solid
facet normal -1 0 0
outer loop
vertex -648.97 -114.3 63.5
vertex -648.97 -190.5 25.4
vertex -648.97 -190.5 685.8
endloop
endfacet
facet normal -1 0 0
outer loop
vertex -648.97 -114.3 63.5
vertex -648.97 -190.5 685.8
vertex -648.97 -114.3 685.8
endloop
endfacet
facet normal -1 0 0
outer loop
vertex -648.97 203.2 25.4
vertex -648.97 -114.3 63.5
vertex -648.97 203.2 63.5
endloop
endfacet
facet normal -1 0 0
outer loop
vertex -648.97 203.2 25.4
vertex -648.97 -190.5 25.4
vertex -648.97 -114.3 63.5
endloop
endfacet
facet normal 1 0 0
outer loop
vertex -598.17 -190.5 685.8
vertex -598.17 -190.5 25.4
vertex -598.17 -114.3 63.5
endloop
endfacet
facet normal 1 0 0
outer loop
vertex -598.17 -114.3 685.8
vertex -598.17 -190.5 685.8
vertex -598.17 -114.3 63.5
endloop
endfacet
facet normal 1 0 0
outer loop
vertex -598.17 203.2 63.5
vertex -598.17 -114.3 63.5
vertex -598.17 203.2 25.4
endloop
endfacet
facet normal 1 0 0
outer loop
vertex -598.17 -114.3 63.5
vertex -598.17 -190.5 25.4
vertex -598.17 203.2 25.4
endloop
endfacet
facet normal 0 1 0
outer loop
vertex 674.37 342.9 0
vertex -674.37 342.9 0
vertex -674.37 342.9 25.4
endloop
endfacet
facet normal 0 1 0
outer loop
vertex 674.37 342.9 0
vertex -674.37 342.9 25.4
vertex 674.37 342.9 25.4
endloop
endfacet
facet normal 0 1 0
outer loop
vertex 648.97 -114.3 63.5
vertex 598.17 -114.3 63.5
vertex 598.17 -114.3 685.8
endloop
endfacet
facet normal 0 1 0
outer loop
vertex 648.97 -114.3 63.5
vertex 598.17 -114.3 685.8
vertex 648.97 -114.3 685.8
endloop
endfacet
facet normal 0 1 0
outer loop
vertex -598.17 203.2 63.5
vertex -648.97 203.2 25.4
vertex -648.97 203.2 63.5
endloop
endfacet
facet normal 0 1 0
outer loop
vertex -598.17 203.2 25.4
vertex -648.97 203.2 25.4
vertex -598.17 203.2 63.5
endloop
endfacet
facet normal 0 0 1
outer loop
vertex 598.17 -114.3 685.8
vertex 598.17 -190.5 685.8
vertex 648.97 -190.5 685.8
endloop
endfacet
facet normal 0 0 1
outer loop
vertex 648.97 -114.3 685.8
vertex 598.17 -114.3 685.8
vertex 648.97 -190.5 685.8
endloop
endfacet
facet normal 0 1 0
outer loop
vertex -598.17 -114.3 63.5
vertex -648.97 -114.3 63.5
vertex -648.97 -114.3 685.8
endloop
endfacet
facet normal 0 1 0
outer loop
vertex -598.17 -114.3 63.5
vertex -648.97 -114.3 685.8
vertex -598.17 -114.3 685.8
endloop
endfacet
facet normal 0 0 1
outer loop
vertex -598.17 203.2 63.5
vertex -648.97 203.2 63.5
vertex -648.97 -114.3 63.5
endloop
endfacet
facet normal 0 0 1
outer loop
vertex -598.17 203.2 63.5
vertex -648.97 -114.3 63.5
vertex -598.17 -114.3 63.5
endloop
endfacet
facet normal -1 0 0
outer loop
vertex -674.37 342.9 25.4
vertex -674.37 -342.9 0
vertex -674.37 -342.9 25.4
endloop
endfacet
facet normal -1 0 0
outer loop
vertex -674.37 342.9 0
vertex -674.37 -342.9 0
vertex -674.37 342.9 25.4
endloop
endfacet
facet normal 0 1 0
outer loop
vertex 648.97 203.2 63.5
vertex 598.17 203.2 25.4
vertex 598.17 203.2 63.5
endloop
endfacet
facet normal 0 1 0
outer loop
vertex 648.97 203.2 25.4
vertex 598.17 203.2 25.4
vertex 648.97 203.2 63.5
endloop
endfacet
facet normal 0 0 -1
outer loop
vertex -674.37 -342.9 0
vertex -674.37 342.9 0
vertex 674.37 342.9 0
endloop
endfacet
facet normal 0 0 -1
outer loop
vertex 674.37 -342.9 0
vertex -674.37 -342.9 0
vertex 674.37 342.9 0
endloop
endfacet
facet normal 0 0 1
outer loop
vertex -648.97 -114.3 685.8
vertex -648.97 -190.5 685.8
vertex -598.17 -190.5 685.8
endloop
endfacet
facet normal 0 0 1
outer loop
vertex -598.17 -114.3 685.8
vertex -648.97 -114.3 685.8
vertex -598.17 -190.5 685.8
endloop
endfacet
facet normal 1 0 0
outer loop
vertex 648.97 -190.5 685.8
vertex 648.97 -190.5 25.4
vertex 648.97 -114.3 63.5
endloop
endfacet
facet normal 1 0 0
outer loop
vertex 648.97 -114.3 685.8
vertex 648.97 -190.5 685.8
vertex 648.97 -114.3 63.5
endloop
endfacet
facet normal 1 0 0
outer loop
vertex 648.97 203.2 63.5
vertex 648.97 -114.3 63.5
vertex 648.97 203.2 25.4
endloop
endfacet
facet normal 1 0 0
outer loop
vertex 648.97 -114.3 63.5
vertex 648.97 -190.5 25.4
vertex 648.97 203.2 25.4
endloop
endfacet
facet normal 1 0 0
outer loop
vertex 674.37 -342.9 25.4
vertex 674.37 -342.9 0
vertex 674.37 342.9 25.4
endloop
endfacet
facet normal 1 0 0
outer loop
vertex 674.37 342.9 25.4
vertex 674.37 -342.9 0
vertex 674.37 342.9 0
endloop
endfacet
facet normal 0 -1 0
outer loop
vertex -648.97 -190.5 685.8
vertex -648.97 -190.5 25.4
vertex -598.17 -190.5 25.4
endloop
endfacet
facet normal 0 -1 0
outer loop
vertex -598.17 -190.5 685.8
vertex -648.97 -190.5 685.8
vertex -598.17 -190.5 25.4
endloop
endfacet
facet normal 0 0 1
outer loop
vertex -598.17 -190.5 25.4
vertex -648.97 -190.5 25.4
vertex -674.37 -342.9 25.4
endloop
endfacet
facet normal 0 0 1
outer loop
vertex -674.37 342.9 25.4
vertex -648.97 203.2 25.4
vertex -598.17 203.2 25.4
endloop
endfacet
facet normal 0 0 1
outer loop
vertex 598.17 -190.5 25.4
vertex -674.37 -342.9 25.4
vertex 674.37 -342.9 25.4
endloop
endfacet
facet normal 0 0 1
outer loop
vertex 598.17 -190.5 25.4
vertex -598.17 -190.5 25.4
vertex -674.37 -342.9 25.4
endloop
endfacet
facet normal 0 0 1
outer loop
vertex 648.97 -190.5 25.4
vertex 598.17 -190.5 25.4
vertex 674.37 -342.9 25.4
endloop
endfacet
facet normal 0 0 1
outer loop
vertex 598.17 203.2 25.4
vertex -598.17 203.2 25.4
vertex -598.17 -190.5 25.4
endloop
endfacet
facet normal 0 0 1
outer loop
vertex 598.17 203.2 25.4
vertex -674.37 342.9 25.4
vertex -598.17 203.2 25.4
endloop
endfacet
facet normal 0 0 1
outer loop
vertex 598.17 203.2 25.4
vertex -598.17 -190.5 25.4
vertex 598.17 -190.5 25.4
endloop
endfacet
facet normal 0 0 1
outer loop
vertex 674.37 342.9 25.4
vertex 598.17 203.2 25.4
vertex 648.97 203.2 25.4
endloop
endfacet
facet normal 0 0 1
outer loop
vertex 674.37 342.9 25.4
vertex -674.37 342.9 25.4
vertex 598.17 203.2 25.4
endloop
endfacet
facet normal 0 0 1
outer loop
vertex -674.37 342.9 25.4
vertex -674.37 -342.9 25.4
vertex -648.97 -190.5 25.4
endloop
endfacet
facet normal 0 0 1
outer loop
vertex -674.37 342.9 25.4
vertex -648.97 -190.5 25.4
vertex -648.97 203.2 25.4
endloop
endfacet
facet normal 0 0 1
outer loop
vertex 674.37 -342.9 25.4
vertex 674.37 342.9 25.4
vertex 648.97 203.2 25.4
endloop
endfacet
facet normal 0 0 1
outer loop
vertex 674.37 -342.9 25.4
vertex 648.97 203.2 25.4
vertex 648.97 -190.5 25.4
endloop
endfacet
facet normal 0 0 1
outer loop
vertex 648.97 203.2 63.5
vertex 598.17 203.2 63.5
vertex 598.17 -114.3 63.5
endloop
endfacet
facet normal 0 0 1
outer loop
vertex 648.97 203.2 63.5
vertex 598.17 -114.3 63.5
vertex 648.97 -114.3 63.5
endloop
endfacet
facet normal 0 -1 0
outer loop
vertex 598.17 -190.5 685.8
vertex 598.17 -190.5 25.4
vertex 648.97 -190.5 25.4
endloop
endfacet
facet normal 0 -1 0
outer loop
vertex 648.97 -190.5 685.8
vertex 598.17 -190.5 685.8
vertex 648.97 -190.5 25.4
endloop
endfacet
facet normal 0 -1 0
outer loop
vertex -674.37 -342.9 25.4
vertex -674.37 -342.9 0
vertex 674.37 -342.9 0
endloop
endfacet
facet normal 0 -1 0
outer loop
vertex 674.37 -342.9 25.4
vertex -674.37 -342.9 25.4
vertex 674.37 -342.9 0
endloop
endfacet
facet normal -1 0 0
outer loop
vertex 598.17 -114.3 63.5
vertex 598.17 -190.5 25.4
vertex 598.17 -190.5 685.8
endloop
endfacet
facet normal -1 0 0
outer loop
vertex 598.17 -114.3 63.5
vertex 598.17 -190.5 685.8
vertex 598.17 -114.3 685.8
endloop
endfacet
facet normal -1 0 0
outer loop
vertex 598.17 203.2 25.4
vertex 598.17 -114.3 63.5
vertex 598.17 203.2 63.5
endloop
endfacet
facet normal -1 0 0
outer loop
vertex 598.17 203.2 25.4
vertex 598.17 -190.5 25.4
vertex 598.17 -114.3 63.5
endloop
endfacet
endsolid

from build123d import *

# Parameters (mm, degrees)
F0_W     = 1348.74
F0_H     = 685.8
F1_DEPTH = 25.4
F3_W     = 50.8
F3_H     = 317.5
F4_DEPTH = 38.1
F5_W     = 50.8
F5_H     = 76.2
F6_DEPTH = 660.4


with BuildPart() as f1:
    # F0 (on Top) → F1 (new body)
    with BuildSketch(Plane.XY):
        Rectangle(F0_W, F0_H)
    extrude(amount=F1_DEPTH)

    # F3 (on face) → F4 (join)
    with BuildSketch(Plane.XY.offset(25.4)):
        with Locations((-623.57, 44.45)):
            Rectangle(F3_W, F3_H)
        with Locations((623.57, 44.45)):
            Rectangle(F3_W, F3_H)
    extrude(amount=F4_DEPTH)

    # F5 (on face) → F6 (join)
    with BuildSketch(Plane.XY.offset(25.4)):
        with Locations((-623.57, -152.4)):
            Rectangle(F5_W, F5_H)
        with Locations((623.57, -152.4)):
            Rectangle(F5_W, F5_H)
    extrude(amount=F6_DEPTH)


solid = f1.part
